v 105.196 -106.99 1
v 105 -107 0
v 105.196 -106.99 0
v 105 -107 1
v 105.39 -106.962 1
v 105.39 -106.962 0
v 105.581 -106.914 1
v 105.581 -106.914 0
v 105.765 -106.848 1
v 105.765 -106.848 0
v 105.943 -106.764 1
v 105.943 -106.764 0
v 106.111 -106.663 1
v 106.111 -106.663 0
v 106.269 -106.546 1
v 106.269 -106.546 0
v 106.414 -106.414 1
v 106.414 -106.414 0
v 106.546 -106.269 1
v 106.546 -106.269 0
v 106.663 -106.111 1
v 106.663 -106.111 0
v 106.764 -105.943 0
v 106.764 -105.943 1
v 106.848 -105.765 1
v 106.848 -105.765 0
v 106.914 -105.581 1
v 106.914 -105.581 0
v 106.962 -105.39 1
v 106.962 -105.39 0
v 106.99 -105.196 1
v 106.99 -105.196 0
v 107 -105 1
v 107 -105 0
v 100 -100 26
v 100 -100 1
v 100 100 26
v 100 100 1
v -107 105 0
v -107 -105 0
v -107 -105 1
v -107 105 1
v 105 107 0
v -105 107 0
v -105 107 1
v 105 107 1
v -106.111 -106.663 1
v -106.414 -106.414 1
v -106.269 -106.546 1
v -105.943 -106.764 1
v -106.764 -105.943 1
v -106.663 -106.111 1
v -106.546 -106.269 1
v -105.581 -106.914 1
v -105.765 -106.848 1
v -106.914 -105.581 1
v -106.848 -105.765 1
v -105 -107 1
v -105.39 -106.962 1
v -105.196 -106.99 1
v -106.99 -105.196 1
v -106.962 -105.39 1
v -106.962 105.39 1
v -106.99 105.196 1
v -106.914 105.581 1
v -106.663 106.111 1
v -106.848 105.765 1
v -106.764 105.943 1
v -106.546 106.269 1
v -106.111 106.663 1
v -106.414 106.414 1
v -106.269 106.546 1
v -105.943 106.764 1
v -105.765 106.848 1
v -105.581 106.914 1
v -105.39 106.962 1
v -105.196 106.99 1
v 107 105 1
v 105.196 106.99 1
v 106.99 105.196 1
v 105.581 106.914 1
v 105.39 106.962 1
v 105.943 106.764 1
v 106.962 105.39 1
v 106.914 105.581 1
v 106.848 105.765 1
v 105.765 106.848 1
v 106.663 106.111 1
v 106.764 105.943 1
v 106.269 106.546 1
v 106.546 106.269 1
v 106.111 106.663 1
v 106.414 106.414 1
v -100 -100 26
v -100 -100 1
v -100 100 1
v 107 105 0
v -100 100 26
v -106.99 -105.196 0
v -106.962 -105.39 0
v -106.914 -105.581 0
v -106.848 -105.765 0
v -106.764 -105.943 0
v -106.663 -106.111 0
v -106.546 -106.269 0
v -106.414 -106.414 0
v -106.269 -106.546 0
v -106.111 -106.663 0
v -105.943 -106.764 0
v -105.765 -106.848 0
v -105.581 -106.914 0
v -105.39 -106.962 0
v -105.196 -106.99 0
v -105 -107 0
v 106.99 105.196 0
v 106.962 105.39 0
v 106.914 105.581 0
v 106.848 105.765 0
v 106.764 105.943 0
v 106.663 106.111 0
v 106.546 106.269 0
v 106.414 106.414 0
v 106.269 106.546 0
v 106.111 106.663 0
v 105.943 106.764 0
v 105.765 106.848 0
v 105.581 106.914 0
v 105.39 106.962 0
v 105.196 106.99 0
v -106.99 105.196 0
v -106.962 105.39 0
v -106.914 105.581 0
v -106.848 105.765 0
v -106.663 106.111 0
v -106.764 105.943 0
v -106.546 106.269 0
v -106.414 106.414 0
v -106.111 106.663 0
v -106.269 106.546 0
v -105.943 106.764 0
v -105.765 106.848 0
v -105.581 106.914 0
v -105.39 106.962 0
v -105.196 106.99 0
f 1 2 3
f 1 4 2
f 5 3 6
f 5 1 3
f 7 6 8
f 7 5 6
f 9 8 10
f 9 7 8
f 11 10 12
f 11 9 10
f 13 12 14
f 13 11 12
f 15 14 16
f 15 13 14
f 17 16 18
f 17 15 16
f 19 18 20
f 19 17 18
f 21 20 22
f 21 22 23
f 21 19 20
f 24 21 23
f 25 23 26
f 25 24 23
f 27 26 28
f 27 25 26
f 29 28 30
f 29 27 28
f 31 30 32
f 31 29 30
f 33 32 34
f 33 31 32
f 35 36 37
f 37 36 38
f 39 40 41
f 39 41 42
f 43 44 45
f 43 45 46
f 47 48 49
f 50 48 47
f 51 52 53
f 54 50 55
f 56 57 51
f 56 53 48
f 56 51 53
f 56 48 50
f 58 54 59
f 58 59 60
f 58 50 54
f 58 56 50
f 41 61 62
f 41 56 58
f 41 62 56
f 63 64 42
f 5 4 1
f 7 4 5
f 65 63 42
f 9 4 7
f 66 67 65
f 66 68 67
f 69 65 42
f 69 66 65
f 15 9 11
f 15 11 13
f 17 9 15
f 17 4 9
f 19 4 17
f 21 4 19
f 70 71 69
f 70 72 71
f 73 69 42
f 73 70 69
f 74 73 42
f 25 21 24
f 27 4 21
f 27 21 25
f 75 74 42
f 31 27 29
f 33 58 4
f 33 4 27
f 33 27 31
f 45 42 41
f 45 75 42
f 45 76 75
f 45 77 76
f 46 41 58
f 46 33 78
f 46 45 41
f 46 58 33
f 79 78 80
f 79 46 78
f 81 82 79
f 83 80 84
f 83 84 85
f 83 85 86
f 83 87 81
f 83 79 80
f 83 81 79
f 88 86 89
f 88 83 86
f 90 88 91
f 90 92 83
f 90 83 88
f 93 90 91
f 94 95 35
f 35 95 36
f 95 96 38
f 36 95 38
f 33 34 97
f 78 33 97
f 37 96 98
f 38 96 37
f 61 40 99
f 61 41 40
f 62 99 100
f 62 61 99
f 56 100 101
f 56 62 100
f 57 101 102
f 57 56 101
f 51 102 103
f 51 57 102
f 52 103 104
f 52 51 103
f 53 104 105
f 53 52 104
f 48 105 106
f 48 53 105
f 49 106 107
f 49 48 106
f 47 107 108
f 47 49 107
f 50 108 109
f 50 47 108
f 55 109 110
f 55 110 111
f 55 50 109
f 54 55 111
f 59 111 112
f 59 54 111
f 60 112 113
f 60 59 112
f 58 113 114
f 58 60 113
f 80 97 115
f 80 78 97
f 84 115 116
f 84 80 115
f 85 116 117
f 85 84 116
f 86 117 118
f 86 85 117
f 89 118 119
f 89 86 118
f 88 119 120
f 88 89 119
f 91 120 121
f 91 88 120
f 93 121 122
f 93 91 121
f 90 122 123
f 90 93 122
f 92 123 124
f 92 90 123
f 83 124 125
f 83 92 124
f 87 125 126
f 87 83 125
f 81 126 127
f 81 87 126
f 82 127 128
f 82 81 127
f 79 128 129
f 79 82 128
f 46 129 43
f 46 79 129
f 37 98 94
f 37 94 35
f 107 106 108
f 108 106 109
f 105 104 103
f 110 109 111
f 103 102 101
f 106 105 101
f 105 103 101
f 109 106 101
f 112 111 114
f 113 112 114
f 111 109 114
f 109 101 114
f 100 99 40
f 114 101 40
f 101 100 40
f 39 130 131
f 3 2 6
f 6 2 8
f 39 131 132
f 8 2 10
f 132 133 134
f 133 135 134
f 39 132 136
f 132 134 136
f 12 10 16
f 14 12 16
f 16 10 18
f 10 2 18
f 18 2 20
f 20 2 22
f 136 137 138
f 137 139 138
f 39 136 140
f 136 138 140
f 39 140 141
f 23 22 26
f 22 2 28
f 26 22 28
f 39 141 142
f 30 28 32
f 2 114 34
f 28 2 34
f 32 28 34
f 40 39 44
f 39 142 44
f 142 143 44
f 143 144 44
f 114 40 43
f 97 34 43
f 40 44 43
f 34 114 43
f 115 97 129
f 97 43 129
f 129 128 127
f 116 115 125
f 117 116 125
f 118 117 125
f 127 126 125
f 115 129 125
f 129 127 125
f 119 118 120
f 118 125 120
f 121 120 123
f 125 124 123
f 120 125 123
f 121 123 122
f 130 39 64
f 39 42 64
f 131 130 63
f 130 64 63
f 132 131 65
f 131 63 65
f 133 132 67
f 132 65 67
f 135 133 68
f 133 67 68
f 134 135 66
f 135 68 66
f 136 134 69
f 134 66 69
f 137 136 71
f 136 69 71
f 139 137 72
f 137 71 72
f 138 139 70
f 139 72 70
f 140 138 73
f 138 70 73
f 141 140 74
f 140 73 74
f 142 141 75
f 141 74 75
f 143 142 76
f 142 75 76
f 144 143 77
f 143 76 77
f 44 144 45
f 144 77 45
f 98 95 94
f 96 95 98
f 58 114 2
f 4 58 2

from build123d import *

# Parameters (mm, degrees)
F0_W     = 214
F0_H     = 214
F1_DEPTH = 1
F2_R     = 2
F3_W     = 200
F3_H     = 200
F4_DEPTH = 25


with BuildPart() as f1:
    # F0 (on Top) → F1 (new body)
    with BuildSketch(Plane.XY):
        Rectangle(F0_W, F0_H)
    extrude(amount=F1_DEPTH)

    # F2
    f2_edges = [f1.edges().sort_by_distance(p)[0] for p in [
        (-107, -107, 0.5),
        (107, -107, 0.5),
        (107, 107, 0.5),
        (-107, 107, 0.5),
    ]]
    fillet(f2_edges, radius=F2_R)


with BuildPart() as f4:
    # F3 (on face) → F4 (new body)
    with BuildSketch(Plane.XY.offset(1)):
        Rectangle(F3_W, F3_H)
    extrude(amount=F4_DEPTH)


solid = Compound([f1.part, f4.part])
